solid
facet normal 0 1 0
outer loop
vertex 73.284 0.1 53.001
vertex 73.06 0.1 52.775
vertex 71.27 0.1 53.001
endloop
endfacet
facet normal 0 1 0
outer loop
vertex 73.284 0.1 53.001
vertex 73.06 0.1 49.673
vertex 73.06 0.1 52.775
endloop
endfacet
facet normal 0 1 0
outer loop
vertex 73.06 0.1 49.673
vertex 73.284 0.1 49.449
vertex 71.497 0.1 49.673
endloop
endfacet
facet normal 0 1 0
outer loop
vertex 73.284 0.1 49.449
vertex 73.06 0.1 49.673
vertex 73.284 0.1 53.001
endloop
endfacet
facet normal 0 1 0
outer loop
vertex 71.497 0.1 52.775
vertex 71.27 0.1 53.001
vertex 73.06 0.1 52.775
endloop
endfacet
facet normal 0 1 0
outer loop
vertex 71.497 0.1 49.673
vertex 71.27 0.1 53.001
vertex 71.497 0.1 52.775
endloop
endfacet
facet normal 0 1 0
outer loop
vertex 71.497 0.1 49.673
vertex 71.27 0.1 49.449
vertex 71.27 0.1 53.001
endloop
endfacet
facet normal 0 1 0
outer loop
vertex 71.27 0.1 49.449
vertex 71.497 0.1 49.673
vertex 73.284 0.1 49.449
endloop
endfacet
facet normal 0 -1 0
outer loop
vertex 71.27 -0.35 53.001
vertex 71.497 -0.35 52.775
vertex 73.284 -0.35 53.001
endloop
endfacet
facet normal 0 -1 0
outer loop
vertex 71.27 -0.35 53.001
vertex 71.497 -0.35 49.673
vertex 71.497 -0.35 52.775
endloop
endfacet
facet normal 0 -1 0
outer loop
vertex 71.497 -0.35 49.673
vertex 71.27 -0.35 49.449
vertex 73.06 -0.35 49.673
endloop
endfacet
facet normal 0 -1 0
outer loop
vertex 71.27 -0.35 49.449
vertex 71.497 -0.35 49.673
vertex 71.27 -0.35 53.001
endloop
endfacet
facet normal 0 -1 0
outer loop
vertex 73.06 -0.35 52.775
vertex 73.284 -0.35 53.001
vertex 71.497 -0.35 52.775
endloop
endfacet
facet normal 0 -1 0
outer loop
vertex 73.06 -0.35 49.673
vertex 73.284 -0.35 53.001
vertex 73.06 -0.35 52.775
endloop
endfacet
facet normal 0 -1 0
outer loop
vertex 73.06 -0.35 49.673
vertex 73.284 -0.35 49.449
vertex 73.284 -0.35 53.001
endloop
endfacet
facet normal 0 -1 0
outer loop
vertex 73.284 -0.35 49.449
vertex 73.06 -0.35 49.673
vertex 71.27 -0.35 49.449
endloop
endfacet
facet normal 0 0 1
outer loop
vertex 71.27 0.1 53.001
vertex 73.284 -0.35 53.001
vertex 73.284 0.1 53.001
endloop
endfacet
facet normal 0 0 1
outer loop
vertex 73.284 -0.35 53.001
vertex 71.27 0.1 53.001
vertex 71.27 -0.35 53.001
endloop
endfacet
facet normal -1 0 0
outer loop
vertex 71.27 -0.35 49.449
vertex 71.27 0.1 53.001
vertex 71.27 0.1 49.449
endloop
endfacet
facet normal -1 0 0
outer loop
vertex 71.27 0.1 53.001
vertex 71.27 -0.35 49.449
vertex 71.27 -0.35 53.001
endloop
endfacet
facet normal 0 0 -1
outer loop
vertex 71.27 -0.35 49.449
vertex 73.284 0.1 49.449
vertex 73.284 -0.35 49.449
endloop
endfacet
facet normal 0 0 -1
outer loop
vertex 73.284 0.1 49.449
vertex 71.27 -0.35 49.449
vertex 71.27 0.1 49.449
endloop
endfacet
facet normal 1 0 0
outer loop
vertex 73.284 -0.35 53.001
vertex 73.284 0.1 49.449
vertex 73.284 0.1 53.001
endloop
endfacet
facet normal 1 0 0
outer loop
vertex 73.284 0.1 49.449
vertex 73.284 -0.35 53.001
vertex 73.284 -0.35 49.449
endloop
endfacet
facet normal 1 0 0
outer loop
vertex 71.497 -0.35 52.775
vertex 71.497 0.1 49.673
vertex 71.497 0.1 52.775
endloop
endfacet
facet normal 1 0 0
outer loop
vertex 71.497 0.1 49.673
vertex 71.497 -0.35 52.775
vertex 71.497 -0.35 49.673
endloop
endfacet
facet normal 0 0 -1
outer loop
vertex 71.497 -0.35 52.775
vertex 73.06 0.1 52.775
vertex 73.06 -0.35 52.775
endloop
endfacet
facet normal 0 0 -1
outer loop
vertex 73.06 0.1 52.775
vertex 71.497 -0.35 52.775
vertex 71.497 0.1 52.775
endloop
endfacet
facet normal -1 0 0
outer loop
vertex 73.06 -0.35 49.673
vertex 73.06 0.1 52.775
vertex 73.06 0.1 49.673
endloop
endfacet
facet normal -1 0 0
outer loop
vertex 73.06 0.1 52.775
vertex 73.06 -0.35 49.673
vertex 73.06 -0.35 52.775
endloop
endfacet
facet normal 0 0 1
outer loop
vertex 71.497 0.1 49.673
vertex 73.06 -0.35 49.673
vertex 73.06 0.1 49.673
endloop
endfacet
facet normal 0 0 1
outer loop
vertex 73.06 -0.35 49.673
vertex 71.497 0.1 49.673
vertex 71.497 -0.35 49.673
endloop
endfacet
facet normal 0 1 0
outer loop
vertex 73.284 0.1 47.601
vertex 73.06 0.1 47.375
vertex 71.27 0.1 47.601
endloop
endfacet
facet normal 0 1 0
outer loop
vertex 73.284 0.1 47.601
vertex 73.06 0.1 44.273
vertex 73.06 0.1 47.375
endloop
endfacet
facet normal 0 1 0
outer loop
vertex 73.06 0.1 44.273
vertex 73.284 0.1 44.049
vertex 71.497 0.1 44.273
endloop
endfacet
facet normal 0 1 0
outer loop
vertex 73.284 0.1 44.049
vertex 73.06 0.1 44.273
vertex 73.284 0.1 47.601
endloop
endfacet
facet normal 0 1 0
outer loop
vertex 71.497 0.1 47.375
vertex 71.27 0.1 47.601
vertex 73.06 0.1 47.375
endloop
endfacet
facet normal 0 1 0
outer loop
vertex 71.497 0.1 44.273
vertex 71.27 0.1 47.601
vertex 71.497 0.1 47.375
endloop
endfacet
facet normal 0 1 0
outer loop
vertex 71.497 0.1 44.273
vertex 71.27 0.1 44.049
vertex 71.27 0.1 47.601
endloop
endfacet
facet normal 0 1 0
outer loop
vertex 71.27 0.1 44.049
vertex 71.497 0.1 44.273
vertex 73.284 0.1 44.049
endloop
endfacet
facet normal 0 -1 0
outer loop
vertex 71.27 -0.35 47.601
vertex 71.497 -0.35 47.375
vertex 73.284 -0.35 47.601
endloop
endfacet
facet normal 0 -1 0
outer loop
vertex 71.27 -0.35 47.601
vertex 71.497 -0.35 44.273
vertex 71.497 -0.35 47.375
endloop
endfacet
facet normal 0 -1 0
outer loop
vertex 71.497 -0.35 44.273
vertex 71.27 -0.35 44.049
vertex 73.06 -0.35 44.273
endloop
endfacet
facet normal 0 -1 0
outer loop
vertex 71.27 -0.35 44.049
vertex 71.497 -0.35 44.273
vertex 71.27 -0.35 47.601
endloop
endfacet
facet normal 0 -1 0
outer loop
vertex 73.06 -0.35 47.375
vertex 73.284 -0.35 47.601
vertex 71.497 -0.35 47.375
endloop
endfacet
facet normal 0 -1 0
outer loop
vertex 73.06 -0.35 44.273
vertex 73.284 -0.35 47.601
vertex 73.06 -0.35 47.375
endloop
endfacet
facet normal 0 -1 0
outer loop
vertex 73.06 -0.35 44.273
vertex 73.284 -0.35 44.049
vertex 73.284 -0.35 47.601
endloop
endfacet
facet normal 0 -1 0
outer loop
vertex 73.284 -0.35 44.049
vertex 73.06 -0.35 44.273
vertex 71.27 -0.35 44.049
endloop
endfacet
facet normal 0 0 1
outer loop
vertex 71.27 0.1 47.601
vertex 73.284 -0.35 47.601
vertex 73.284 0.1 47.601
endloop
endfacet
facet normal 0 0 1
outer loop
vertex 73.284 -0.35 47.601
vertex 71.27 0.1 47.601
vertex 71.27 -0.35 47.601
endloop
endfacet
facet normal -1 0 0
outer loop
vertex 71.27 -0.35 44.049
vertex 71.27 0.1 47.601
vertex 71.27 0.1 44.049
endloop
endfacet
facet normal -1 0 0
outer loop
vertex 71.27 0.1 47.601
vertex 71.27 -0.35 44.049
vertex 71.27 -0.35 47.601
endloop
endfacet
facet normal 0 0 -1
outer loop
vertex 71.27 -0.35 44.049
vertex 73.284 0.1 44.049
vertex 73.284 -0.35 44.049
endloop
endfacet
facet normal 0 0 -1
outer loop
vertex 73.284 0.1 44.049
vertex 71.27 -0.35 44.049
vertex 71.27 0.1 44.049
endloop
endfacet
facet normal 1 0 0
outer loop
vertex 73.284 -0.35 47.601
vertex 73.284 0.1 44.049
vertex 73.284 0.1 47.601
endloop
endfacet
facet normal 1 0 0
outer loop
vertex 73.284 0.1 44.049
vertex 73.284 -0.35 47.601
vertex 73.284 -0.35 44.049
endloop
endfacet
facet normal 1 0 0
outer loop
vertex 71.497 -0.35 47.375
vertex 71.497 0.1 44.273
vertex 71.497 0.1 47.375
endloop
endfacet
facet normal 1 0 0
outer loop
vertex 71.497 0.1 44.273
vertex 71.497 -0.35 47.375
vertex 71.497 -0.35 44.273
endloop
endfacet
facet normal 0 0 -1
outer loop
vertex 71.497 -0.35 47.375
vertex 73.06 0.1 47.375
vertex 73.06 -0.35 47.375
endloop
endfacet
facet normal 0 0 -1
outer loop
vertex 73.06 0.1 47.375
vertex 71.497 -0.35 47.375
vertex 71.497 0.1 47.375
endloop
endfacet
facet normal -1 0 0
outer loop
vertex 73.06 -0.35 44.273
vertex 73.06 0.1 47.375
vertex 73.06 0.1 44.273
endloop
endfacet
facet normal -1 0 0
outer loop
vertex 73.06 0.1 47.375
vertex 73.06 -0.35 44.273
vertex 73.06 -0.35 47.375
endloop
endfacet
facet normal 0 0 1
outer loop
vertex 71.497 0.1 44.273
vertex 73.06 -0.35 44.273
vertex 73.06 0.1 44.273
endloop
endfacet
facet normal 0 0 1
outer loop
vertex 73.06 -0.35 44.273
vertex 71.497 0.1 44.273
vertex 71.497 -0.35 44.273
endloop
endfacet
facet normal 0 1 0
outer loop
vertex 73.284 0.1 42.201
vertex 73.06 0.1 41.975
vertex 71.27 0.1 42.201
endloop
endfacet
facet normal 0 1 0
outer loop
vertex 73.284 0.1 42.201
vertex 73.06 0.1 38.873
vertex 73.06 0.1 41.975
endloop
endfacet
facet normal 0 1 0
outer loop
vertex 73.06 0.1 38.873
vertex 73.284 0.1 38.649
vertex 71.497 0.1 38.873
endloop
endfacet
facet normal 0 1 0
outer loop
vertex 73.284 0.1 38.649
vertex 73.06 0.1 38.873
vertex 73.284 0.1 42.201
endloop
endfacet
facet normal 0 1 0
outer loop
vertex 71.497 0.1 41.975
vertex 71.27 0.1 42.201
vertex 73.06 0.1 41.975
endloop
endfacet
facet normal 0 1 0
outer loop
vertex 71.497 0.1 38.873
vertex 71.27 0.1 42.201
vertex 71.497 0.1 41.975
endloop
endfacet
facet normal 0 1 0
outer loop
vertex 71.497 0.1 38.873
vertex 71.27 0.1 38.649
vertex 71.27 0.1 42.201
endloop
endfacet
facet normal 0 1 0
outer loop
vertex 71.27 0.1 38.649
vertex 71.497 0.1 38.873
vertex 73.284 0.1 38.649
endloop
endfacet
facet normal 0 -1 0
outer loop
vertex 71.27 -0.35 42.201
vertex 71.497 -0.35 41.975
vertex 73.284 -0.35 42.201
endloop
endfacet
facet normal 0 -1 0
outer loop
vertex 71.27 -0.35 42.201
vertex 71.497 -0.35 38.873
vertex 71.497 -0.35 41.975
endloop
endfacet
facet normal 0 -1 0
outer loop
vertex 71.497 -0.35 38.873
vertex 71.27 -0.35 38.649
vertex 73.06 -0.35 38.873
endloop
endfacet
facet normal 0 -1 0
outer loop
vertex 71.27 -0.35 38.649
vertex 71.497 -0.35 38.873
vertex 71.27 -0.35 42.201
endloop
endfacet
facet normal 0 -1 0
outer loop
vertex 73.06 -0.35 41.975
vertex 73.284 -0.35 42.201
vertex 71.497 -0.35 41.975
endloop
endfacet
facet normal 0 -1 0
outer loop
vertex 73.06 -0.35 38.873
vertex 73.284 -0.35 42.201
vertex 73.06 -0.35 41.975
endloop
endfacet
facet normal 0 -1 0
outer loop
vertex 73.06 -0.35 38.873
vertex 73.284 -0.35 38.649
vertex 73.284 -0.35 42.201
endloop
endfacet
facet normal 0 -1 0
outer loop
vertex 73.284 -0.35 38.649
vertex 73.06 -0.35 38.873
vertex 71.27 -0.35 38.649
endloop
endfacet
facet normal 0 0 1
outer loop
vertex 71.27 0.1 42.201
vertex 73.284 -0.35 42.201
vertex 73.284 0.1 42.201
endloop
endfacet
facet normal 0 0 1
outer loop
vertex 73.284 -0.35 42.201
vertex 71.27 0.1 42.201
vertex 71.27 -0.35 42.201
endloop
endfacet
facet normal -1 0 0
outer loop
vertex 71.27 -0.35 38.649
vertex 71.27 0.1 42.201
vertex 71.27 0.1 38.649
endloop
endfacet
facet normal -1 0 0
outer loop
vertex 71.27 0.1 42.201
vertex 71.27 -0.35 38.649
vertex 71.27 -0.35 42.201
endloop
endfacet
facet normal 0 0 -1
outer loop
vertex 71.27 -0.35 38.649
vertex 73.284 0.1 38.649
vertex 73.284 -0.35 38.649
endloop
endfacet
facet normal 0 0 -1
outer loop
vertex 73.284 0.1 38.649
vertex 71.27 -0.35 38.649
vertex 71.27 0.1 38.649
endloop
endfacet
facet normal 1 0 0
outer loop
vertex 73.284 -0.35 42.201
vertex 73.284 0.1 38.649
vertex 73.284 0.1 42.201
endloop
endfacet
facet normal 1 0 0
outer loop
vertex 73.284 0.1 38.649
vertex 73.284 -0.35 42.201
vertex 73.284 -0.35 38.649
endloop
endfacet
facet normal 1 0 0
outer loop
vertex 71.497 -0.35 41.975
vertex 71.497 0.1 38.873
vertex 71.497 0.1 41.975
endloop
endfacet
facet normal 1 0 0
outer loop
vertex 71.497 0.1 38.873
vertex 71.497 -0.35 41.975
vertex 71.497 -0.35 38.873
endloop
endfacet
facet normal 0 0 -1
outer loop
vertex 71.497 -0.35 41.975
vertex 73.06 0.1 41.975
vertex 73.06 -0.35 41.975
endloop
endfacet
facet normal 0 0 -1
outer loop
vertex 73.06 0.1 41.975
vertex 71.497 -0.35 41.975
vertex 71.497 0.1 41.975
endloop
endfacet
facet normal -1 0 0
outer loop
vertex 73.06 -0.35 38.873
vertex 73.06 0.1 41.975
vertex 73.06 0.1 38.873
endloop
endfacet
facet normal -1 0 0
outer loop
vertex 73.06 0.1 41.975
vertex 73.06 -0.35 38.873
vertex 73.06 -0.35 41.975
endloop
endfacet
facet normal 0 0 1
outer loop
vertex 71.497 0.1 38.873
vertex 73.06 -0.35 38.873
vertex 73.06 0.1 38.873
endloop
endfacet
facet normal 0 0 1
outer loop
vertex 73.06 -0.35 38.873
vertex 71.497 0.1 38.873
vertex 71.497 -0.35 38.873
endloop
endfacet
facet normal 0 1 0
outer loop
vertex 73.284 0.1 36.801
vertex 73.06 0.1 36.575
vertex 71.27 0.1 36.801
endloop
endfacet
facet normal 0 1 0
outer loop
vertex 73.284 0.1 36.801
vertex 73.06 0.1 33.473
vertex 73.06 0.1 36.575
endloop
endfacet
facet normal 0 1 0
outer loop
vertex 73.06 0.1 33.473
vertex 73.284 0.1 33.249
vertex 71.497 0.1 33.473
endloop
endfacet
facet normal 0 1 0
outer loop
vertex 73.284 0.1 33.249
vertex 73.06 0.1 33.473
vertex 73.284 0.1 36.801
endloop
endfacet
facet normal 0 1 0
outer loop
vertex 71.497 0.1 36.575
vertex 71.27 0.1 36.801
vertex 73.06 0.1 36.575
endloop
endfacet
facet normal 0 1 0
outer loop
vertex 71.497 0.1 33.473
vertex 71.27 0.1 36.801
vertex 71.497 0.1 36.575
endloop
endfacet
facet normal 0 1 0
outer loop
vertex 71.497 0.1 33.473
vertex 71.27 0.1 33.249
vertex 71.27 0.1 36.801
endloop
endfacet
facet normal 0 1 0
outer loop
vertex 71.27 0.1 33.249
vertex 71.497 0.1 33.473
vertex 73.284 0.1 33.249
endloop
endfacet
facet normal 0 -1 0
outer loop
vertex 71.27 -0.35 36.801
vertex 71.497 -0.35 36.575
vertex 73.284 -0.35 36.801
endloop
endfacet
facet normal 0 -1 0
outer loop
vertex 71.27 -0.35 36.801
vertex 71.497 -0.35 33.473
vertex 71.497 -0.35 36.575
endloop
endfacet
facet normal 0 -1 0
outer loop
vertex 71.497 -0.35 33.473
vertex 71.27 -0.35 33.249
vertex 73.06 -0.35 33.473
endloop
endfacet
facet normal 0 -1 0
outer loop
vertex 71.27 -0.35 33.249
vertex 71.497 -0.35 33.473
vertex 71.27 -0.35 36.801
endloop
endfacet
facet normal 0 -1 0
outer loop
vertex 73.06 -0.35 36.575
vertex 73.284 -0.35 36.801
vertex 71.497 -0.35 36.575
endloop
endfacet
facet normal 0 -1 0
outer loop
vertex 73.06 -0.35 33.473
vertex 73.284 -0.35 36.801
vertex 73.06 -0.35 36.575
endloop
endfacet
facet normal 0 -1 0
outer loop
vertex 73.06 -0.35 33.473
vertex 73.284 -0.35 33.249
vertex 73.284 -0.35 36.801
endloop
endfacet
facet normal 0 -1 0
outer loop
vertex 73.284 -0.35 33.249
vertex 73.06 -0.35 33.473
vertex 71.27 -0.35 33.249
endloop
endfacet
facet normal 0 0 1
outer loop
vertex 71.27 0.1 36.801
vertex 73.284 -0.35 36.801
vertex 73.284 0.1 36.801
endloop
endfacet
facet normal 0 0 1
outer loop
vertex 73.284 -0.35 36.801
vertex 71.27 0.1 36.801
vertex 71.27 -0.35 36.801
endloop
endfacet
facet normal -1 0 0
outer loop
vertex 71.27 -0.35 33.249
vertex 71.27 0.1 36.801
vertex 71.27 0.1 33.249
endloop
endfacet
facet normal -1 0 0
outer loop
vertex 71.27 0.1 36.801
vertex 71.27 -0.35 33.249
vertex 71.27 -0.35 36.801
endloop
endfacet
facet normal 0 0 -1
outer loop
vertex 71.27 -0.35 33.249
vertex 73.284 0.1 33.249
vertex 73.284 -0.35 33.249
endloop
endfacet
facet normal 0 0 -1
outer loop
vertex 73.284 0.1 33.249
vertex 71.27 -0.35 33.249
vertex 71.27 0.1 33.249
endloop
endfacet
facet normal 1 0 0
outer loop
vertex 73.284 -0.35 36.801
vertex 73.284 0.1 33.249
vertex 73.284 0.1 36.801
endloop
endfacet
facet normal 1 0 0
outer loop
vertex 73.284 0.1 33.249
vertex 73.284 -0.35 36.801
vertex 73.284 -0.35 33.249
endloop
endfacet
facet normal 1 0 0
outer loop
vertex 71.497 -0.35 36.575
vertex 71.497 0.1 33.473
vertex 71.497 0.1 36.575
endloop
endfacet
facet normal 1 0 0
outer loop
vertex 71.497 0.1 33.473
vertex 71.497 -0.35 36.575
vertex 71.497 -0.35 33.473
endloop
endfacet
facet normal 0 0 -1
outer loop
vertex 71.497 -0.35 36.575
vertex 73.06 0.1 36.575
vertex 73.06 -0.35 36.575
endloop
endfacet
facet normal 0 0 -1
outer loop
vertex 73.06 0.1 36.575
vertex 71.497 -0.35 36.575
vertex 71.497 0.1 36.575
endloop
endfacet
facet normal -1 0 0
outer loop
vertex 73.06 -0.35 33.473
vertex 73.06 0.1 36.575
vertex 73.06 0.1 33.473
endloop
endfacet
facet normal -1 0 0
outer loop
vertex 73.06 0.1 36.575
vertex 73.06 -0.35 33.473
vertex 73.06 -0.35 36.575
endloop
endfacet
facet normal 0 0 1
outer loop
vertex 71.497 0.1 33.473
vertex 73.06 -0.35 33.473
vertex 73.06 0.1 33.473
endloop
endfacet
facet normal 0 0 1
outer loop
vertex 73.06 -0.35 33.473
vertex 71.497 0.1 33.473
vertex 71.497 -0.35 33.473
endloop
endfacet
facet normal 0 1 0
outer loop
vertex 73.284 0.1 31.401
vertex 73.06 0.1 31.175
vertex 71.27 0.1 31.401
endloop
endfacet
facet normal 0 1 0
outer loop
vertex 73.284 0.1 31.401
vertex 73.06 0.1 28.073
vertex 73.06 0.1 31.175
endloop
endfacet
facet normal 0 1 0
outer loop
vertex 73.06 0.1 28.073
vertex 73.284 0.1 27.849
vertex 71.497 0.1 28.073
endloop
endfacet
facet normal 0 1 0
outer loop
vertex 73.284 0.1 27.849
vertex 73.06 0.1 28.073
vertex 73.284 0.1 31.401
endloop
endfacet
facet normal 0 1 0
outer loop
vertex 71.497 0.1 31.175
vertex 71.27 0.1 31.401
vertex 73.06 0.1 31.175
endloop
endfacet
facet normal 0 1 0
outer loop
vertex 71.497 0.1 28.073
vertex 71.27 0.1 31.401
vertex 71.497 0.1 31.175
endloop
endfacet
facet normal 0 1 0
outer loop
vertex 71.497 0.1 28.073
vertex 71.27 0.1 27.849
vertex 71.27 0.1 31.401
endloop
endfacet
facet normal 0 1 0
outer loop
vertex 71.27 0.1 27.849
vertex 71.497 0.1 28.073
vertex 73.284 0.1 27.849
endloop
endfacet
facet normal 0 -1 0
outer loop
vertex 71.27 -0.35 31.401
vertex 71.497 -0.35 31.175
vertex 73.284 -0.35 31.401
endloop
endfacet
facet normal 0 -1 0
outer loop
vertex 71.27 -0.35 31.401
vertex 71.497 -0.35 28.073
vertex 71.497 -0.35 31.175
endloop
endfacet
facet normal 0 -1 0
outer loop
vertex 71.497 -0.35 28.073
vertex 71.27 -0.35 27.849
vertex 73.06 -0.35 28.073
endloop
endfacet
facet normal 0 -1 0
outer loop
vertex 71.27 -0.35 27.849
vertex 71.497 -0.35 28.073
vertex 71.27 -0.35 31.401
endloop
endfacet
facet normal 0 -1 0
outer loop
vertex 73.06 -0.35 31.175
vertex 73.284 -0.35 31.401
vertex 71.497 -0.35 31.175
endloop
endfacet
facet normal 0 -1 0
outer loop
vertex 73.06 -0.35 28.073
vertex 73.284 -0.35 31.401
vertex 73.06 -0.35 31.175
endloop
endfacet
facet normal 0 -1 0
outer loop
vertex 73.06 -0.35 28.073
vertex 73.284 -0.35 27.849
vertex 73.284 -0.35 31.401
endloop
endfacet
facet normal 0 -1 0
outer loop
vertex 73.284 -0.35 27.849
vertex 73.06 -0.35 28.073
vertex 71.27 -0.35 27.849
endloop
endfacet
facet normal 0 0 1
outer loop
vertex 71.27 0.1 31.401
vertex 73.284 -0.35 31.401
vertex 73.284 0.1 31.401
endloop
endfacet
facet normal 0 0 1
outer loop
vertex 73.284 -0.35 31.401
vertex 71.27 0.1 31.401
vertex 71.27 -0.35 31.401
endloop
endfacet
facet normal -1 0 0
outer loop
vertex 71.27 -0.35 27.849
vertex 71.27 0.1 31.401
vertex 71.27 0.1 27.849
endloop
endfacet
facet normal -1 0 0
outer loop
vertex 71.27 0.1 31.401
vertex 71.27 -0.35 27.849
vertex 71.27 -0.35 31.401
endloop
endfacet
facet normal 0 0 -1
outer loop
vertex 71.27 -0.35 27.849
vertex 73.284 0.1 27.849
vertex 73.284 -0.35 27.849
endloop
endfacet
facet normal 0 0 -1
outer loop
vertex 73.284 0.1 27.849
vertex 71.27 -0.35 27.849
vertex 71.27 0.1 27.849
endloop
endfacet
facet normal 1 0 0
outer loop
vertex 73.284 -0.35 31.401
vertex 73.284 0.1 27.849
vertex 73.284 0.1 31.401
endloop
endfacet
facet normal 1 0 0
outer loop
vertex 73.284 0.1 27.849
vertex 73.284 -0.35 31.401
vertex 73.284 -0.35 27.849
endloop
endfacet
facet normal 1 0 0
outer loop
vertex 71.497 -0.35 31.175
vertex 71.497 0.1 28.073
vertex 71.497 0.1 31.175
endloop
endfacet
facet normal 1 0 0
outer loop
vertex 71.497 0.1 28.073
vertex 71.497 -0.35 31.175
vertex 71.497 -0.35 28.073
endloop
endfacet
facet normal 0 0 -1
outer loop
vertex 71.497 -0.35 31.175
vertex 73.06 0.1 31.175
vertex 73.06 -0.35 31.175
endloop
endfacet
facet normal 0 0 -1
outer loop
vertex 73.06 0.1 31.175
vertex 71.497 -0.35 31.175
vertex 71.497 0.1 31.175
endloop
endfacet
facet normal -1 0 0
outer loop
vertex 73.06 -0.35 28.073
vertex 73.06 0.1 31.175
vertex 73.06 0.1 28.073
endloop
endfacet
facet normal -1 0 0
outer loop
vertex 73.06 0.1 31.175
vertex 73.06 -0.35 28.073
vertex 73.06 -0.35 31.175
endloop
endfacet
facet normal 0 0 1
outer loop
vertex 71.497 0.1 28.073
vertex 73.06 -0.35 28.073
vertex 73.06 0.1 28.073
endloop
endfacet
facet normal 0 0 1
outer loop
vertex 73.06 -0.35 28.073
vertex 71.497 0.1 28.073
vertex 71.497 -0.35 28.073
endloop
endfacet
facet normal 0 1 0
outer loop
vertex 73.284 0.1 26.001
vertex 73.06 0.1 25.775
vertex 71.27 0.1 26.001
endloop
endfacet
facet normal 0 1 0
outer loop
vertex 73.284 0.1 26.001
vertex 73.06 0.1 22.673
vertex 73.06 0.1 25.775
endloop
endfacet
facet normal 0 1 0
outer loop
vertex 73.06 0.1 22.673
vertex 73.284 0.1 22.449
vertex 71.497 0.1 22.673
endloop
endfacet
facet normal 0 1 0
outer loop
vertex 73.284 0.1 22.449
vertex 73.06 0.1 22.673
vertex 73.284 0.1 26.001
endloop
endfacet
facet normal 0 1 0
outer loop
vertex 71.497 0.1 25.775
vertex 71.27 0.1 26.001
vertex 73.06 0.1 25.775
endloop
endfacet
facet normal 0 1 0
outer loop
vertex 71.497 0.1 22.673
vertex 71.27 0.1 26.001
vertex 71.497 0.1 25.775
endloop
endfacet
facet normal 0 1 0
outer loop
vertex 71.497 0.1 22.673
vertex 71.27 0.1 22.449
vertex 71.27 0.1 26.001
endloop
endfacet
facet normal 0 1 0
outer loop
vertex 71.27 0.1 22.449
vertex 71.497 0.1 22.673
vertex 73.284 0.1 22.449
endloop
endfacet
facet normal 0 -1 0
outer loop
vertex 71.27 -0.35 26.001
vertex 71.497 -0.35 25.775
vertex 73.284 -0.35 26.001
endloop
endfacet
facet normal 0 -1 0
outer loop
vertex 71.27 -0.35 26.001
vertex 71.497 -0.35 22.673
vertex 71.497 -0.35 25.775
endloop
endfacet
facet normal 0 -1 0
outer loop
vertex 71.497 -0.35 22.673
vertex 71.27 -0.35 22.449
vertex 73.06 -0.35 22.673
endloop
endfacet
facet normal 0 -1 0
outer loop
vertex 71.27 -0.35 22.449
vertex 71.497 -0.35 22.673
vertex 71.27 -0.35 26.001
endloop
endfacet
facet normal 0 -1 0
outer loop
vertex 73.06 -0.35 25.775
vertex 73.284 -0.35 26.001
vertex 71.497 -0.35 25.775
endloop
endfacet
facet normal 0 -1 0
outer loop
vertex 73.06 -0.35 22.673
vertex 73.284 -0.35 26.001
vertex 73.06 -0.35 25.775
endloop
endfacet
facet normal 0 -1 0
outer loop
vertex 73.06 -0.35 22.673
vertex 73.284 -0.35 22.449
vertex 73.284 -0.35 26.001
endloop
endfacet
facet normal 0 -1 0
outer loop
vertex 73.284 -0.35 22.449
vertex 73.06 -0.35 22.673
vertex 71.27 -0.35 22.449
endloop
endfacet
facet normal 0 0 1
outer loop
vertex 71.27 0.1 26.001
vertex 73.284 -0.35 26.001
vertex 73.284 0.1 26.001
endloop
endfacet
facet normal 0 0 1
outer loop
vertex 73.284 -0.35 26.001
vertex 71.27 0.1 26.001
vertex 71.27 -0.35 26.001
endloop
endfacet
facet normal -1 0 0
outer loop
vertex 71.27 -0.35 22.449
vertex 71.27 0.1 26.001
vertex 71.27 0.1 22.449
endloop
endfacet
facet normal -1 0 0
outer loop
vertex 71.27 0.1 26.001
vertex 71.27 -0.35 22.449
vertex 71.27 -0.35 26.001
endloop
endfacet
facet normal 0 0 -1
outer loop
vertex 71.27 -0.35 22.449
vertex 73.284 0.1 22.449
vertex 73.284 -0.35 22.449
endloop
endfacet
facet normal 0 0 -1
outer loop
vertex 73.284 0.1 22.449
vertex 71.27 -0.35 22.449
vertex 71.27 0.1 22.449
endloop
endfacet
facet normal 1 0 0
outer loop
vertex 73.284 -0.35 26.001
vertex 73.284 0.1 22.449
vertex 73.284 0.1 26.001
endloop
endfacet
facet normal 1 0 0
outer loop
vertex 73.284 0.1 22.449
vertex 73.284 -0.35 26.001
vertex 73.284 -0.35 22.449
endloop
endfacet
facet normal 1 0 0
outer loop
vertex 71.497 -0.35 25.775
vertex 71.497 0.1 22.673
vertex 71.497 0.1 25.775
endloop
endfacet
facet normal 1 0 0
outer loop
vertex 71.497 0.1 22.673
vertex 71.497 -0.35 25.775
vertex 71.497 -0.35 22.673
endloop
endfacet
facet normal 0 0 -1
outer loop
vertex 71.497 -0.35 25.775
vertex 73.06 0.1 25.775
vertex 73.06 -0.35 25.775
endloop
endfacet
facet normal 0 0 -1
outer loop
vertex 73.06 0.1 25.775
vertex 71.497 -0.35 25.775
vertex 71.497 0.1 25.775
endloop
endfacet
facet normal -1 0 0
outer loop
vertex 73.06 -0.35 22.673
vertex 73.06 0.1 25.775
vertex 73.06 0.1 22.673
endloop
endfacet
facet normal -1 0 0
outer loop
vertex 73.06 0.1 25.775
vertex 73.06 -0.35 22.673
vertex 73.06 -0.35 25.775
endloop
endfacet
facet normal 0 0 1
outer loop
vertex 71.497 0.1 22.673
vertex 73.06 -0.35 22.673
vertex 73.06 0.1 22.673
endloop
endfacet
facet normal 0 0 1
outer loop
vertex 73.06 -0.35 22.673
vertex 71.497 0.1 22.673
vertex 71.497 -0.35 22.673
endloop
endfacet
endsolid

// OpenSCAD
// Text geometry generated from installed Noto Sans CJK TC Bold; font file not bundled.
// Six visible school-name characters. Badge internals / tiny English wall inscription omitted.
$fn = 18;
chars = ["臺", "北", "基", "督", "學", "院"];
for (i = [0:5])
  translate([72.25, 0.10, 51.2 - i*5.4])
    rotate([90,0,0])
      linear_extrude(height=0.45)
        text(chars[i], size=2.9, font="Noto Sans CJK TC:style=Bold", halign="center", valign="center", spacing=1);
